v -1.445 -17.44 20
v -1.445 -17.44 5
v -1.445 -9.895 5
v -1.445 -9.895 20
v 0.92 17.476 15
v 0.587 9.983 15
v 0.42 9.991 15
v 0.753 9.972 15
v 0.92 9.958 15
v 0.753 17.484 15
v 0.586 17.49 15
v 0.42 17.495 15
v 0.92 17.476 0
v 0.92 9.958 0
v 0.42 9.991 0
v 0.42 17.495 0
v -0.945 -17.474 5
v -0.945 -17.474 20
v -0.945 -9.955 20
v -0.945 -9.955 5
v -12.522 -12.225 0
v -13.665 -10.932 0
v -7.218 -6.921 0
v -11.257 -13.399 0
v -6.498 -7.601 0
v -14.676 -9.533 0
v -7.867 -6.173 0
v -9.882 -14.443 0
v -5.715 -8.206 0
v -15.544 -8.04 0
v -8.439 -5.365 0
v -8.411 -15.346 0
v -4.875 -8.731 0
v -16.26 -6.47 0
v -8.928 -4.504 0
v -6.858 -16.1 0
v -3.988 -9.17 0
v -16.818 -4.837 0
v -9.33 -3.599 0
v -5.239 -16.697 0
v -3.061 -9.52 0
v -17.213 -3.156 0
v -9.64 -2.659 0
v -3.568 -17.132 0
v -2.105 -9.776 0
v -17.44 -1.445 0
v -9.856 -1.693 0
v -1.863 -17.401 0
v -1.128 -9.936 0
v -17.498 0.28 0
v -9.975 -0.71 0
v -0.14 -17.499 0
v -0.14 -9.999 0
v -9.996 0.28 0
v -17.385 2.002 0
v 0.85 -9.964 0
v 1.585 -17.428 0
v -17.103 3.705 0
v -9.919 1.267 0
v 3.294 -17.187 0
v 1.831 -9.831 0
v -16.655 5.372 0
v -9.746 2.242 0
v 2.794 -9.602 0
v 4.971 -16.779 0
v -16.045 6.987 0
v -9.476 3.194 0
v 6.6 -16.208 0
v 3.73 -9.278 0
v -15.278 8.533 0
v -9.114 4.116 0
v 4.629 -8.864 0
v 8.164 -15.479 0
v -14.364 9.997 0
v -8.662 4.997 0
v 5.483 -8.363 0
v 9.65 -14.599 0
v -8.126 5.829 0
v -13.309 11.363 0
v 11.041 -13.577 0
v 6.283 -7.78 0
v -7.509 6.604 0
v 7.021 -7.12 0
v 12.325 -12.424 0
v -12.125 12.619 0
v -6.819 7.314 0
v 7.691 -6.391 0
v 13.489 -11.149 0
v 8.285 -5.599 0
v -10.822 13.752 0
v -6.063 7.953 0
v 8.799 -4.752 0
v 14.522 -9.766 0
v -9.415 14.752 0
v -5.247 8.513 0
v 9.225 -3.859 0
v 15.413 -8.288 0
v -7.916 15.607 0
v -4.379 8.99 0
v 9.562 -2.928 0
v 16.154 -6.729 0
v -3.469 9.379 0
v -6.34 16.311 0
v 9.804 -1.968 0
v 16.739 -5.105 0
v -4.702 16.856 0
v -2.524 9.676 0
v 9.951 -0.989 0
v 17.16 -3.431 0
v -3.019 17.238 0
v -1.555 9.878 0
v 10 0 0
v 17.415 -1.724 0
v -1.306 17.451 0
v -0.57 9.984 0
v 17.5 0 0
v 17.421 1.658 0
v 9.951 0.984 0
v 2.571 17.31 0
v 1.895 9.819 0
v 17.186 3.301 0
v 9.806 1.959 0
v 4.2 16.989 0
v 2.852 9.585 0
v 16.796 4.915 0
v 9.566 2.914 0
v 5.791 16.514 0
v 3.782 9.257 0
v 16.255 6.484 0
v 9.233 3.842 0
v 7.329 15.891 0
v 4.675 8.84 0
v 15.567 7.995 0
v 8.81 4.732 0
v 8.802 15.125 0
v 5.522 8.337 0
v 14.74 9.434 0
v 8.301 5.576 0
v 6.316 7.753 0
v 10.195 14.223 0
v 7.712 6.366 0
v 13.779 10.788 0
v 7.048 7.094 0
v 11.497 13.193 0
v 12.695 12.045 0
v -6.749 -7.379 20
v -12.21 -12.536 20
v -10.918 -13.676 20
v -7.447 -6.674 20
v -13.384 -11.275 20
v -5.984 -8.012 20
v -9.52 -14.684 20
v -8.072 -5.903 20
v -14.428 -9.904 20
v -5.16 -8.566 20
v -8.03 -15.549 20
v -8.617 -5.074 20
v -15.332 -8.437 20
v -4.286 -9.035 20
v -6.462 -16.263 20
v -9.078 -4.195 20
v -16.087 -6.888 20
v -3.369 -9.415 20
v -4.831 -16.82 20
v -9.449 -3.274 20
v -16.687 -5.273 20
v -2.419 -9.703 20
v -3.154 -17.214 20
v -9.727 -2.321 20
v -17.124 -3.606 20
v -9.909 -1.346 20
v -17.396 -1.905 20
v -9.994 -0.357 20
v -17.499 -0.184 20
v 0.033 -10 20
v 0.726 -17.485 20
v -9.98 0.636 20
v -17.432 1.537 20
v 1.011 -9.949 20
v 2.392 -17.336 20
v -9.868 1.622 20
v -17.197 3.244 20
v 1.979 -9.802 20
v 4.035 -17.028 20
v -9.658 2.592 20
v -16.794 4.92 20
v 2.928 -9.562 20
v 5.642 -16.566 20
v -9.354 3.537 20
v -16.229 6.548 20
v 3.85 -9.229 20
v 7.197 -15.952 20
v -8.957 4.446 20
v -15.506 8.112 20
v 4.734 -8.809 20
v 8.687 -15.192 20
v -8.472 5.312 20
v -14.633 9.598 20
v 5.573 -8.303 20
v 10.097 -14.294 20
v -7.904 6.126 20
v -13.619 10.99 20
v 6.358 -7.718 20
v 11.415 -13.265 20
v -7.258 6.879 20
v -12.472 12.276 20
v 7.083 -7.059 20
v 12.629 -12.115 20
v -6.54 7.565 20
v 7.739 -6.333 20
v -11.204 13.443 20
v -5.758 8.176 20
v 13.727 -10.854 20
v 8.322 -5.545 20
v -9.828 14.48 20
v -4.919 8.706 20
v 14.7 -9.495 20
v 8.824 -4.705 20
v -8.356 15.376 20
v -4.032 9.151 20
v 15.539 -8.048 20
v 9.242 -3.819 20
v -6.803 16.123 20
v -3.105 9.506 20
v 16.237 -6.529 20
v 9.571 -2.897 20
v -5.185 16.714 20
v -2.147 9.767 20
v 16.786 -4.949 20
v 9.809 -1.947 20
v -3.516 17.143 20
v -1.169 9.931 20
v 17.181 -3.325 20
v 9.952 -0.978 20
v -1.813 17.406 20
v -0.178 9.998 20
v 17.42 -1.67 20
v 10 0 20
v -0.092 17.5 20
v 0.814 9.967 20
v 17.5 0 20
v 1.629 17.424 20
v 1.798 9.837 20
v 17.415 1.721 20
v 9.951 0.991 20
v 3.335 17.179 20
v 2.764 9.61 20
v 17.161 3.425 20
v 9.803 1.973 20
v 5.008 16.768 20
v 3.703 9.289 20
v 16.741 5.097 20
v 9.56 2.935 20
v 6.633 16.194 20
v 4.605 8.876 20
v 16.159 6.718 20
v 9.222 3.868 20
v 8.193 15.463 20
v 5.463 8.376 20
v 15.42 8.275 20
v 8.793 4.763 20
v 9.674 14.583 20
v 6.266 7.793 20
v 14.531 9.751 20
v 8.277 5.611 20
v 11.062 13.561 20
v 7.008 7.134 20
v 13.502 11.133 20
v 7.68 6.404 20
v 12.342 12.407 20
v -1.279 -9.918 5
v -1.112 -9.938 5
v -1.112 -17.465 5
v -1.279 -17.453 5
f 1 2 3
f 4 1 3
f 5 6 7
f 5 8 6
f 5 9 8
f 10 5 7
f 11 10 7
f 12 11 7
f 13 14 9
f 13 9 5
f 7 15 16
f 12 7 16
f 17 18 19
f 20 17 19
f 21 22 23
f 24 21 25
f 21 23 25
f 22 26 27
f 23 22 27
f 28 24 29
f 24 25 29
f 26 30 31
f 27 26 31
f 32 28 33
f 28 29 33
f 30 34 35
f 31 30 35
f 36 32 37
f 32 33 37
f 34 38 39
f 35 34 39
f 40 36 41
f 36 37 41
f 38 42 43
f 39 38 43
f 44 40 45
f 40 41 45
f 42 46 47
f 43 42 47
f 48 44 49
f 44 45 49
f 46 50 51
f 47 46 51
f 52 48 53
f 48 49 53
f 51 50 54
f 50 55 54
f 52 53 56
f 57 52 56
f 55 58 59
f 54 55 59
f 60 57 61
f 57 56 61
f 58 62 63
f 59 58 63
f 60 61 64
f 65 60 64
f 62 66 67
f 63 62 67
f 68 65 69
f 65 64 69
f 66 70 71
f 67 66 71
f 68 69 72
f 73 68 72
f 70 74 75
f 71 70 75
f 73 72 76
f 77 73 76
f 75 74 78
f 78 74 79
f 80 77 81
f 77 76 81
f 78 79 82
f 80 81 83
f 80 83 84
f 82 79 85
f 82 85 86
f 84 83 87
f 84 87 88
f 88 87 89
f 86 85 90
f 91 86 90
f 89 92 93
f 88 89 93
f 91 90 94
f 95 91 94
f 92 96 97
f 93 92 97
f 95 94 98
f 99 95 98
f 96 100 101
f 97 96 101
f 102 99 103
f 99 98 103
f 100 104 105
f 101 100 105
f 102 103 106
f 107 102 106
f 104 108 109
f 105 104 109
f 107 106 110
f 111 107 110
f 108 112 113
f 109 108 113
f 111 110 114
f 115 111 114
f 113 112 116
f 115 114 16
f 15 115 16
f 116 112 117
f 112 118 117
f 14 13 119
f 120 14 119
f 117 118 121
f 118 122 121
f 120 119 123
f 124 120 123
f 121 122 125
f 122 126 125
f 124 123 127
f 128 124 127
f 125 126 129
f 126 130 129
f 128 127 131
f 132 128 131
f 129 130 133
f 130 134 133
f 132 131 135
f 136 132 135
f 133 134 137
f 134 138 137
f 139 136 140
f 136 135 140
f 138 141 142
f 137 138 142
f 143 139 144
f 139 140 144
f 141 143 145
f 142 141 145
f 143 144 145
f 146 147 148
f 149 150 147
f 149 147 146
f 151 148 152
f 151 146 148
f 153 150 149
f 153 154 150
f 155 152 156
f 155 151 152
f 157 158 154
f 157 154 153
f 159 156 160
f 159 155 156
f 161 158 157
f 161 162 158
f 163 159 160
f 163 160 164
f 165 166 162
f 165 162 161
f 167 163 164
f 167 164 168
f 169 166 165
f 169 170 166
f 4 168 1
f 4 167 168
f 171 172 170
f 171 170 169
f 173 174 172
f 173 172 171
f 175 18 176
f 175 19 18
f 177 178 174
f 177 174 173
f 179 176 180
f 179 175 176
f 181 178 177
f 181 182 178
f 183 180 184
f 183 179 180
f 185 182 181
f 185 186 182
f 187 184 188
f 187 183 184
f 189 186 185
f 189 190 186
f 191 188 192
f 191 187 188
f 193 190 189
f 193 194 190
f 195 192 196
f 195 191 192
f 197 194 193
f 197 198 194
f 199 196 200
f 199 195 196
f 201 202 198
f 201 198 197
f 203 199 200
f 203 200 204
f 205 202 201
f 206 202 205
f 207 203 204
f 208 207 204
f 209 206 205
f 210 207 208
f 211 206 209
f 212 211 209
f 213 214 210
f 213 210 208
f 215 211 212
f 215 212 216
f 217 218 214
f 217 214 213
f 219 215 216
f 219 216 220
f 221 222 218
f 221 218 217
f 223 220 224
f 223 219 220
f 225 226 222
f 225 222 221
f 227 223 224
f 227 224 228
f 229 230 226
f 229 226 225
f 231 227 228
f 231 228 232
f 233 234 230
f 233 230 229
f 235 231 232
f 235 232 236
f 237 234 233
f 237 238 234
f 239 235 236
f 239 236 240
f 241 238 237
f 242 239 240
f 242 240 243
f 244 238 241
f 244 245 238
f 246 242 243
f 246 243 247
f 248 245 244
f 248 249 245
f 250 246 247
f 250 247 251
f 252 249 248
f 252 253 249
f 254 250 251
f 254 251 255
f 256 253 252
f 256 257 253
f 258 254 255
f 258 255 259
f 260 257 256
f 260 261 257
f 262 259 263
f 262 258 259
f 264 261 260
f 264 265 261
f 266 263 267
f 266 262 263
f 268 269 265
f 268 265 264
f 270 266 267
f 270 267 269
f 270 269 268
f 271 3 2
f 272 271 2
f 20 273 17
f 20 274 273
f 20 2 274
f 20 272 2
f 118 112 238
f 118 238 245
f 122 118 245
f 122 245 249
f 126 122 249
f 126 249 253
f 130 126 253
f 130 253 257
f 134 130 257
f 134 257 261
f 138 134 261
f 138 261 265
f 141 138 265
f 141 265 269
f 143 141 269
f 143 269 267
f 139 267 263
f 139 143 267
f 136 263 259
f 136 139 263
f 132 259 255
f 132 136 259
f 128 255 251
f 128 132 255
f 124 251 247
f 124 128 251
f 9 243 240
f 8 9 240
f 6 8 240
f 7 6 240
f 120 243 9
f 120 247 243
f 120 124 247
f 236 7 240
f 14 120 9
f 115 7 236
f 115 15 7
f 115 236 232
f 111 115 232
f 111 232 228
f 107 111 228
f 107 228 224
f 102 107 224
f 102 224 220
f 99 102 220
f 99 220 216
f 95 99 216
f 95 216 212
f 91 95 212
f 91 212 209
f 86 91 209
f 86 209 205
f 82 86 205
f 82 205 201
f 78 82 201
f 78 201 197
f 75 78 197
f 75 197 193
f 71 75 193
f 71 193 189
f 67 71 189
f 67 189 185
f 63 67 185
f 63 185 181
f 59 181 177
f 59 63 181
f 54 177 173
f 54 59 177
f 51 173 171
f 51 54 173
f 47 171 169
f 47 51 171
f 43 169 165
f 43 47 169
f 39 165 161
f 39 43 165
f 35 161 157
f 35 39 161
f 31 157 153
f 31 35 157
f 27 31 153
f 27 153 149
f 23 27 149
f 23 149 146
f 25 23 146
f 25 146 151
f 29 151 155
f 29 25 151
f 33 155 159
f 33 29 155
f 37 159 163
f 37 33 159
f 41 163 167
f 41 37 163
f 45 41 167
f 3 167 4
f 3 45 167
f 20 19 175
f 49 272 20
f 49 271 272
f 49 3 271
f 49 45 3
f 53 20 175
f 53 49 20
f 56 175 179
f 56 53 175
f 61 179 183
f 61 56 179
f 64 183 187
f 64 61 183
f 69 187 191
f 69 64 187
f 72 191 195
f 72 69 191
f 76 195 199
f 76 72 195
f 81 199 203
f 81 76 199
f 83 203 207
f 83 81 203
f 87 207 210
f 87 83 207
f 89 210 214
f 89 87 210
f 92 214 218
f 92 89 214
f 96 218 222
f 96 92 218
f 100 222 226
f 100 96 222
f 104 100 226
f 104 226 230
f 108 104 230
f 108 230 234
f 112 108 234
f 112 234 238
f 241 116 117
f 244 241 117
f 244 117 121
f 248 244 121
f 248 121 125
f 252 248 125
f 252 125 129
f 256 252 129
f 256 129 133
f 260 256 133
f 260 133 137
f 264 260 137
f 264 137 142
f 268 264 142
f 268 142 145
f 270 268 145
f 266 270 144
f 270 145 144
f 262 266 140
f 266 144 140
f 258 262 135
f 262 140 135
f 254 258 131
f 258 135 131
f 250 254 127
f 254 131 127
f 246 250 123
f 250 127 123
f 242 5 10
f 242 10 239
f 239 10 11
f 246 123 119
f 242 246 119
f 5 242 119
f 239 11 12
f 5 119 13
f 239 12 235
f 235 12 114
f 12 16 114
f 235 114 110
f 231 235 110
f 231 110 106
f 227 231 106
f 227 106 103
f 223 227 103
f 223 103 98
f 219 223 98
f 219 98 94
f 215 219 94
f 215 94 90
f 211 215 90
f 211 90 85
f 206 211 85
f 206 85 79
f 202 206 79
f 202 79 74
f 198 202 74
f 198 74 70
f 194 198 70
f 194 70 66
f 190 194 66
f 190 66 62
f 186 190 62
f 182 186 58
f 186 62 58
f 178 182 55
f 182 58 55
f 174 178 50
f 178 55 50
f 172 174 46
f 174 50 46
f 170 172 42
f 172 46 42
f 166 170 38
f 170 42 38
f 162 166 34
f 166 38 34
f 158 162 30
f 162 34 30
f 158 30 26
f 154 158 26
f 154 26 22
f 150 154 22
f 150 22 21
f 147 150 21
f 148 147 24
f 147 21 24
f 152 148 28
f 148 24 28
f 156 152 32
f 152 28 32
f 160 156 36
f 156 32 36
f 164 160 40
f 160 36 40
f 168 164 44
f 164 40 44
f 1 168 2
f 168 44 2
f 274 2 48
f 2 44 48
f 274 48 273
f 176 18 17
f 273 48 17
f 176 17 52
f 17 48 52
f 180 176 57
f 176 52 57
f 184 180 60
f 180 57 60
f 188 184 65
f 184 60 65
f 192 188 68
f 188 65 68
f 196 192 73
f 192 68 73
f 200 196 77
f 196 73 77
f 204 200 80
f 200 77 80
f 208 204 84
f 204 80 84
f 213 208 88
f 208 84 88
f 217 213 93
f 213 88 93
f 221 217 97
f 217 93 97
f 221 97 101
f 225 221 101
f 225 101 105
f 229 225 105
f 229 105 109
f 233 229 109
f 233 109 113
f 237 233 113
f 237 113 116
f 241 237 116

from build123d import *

# Parameters (mm, degrees)
SKETCH_1_R          = 17.5
SKETCH_1_R_2        = 10
EXTRUDE_1_DEPTH     = 20
SKETCH_2_W          = 0.5
SKETCH_2_H          = 19.301562603
CUT_EXTRUDE_1_DEPTH = 15
SKETCH_3_W          = 0.5
SKETCH_3_H          = 20.813345434
CUT_EXTRUDE_2_DEPTH = 15


with BuildPart() as part:
    # 草图1 → 凸台-拉伸1 (new body)
    with BuildSketch(Plane.XY):
        Circle(SKETCH_1_R)
        Circle(SKETCH_1_R_2, mode=Mode.SUBTRACT)
    extrude(amount=EXTRUDE_1_DEPTH)

    # 草图2 → 切除-拉伸1 (cut)
    with BuildSketch(Plane.XY.offset(20)):
        with Locations((-1.195478964, -9.928284345)):
            Rectangle(SKETCH_2_W, SKETCH_2_H)
    extrude(amount=-CUT_EXTRUDE_1_DEPTH, mode=Mode.SUBTRACT)

    # 草图3 → 切除-拉伸2 (cut)
    with BuildSketch(Plane(origin=(0, 0, 0), x_dir=(-1, 0, 0), z_dir=(0, 0, -1))):
        with Locations((-0.669659449, 7.720299062)):
            Rectangle(SKETCH_3_W, SKETCH_3_H)
    extrude(amount=-CUT_EXTRUDE_2_DEPTH, mode=Mode.SUBTRACT)


solid = part.part
